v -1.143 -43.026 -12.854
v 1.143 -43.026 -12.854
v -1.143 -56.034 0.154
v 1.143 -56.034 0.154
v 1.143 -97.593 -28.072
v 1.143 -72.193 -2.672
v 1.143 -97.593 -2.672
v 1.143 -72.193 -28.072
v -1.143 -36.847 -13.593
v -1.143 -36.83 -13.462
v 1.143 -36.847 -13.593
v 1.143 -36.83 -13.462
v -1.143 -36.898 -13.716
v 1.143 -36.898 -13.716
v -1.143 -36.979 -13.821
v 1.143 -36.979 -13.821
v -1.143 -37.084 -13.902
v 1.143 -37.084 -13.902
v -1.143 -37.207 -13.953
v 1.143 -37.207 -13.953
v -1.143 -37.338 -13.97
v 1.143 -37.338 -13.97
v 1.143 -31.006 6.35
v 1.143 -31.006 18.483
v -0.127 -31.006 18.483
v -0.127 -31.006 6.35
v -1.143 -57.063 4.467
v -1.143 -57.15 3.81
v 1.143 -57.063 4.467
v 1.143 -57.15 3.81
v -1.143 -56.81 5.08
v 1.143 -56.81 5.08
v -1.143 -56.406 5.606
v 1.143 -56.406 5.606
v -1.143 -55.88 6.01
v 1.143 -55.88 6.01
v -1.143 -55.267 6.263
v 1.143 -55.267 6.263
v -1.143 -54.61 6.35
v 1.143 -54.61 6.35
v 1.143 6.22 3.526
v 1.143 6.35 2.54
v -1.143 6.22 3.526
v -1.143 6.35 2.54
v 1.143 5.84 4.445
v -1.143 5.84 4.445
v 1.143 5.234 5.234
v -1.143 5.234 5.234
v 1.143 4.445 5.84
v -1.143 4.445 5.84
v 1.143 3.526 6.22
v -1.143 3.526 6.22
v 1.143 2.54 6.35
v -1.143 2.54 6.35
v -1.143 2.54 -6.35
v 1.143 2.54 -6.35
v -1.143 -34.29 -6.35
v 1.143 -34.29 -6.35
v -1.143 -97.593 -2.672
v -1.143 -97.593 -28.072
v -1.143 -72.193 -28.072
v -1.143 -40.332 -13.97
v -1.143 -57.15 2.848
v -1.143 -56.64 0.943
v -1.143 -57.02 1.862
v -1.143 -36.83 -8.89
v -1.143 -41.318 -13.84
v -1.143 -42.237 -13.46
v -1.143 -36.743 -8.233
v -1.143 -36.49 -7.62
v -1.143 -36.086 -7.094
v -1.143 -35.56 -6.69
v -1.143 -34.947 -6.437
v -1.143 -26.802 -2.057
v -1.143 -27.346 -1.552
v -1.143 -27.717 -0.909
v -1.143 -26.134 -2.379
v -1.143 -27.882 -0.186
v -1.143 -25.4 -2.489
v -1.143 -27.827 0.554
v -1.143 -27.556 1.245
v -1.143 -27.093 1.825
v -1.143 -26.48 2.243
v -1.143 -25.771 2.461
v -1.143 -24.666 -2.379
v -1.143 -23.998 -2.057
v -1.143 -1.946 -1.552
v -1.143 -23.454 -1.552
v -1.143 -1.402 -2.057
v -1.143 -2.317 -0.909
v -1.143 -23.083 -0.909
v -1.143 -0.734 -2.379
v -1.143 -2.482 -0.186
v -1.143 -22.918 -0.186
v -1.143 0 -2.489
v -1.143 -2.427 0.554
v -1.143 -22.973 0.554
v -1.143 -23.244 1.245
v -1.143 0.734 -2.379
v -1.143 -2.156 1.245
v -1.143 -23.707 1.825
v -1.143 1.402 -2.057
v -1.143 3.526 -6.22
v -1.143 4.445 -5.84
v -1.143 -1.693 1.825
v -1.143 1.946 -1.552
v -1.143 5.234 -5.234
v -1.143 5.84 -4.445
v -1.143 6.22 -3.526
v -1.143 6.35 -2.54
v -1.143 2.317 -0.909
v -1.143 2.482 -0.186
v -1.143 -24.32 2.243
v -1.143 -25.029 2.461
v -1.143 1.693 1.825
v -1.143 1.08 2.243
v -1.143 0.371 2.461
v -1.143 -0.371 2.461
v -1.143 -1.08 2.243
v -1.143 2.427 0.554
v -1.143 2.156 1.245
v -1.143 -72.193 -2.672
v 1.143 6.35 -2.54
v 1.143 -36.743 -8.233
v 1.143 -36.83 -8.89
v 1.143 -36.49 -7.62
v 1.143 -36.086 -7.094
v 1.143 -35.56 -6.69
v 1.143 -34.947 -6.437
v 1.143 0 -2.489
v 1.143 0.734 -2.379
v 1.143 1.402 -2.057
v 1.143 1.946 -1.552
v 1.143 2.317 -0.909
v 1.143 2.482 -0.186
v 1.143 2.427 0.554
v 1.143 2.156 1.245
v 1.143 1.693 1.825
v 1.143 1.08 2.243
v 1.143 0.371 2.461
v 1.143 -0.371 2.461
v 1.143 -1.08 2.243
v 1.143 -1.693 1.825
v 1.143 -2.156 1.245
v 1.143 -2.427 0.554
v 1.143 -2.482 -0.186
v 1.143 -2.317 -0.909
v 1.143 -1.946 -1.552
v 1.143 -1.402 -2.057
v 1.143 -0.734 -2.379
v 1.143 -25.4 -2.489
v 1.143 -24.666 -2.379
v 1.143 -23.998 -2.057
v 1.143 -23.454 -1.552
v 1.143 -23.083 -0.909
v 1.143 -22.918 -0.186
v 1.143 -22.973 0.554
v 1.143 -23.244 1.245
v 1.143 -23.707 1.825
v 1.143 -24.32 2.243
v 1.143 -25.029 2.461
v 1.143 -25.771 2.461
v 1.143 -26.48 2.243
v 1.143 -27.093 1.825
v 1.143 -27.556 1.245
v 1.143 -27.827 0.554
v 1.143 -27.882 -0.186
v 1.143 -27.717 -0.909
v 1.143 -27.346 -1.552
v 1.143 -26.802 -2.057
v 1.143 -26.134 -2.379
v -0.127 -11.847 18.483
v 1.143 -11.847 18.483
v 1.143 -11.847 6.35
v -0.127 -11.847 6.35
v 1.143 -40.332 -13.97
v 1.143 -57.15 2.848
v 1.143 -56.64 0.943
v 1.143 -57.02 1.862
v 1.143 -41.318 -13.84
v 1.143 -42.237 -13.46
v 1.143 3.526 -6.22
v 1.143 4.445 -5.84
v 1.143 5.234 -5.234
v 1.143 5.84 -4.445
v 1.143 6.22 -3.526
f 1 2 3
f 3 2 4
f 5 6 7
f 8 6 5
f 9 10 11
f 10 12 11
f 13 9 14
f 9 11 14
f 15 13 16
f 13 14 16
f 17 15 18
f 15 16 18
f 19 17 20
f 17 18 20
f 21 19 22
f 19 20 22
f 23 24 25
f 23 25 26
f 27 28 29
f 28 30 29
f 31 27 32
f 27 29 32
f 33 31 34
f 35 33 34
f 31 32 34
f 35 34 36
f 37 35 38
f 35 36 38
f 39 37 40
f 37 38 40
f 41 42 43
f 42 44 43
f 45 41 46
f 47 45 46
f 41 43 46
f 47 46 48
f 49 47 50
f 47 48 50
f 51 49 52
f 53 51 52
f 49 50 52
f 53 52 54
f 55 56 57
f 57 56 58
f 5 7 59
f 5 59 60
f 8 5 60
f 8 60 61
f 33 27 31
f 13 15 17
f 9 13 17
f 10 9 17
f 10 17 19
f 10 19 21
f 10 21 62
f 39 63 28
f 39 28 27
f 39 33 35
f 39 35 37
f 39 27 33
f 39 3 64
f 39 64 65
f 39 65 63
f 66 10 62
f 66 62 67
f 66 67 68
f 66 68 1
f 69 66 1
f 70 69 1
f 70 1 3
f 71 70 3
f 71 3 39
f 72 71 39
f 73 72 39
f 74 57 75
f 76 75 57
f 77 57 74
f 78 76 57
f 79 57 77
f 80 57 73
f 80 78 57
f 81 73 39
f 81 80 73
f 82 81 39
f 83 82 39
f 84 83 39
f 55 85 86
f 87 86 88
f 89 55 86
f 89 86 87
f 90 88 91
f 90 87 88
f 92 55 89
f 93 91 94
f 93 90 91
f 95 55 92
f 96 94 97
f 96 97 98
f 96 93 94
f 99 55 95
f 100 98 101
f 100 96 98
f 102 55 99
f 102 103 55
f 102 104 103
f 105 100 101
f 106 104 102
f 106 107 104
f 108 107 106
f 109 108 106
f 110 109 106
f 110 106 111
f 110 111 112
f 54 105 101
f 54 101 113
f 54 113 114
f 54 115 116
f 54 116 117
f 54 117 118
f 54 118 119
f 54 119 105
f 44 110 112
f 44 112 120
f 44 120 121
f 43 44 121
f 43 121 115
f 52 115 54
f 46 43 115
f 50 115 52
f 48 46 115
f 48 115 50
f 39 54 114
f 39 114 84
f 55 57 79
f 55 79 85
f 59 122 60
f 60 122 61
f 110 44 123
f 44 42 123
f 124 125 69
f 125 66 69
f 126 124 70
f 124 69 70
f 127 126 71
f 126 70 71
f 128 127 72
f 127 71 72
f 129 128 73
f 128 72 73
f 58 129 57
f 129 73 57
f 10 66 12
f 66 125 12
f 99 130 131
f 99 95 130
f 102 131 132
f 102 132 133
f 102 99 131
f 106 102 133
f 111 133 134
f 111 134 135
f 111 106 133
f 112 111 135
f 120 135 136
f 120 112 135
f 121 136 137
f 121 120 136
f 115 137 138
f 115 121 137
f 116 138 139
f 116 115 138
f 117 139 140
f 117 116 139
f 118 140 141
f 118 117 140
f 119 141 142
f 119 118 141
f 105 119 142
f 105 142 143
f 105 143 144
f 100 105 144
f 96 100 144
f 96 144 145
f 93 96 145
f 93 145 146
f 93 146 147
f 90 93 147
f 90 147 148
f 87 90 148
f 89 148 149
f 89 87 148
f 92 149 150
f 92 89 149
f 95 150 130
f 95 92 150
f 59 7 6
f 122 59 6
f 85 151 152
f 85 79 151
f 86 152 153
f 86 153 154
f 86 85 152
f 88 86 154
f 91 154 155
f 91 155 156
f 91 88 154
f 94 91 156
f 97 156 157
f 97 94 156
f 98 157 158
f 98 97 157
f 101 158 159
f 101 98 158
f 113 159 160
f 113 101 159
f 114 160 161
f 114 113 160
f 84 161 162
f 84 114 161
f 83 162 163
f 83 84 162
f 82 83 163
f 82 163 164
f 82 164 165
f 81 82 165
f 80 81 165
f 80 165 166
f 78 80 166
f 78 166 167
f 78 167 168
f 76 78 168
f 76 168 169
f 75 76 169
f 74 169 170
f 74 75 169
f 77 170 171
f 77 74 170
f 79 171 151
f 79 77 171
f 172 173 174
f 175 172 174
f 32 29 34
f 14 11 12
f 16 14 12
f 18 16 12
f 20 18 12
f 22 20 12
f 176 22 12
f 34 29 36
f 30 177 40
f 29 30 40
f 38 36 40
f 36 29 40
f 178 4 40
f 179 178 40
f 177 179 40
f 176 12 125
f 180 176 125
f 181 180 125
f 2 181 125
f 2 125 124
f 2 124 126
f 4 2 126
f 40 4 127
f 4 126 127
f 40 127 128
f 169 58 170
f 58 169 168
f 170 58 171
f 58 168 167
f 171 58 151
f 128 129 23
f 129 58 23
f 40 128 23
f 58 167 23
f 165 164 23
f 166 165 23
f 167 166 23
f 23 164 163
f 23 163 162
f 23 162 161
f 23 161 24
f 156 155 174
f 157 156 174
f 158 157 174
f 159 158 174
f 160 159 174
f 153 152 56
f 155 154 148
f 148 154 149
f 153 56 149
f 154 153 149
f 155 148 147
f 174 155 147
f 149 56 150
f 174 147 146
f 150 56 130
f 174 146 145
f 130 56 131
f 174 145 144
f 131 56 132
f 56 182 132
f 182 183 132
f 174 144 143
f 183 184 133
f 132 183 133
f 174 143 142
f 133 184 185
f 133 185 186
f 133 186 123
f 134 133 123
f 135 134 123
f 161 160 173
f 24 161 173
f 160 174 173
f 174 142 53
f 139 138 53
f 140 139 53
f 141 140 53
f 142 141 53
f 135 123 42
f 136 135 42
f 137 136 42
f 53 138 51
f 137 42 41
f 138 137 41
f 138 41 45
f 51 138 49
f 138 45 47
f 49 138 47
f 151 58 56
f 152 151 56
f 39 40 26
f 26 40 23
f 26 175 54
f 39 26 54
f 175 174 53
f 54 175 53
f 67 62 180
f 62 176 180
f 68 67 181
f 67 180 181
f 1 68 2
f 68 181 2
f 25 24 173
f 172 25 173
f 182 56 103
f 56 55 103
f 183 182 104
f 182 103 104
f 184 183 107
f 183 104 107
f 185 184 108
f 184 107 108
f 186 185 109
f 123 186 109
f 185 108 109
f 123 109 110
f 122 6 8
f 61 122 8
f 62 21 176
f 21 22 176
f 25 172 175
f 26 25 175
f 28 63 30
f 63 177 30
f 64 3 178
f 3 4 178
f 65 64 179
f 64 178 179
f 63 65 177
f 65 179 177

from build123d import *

# Parameters (mm, degrees)
SKETCH1_R           = 2.4892
BOSS_EXTRUDE1_DEPTH = 1.143
FILLET1_R           = 2.54
FILLET2_R           = 0.508
FILLET3_R           = 3.81
FILLET4_R           = 2.54
SKETCH4_W           = 25.4
SKETCH4_H           = 25.4
BOSS_EXTRUDE4_DEPTH = 2.286
SKETCH5_W           = 12.133155836
SKETCH5_H           = 19.15881217
BOSS_EXTRUDE5_DEPTH = 1.27


with BuildPart() as part:
    # Sketch1 → Boss-Extrude1 (new, symmetric)
    with BuildSketch(Plane(origin=(0, 0, 0), x_dir=(0, 0, -1), z_dir=(1, 0, 0))):
        Polygon((-6.35, -57.15), (-6.35, 6.35), (6.35, 6.35), (6.35, -36.83), (13.97, -36.83), (13.97, -41.91), (-1.27, -57.15), align=None)
        Circle(SKETCH1_R, mode=Mode.SUBTRACT)
        with Locations((0, -25.4)):
            Circle(SKETCH1_R, mode=Mode.SUBTRACT)
    extrude(amount=BOSS_EXTRUDE1_DEPTH, both=True)

    # Fillet1
    fillet1_edges = [part.edges().sort_by_distance(p)[0] for p in [
        (0, -36.83, -6.35),
    ]]
    fillet(fillet1_edges, radius=FILLET1_R)

    # Fillet2
    fillet2_edges = [part.edges().sort_by_distance(p)[0] for p in [
        (0, -36.83, -13.97),
    ]]
    fillet(fillet2_edges, radius=FILLET2_R)

    # Fillet3
    fillet3_edges = [part.edges().sort_by_distance(p)[0] for p in [
        (0, 6.35, -6.35),
        (0, -41.91, -13.97),
        (0, -57.15, 1.27),
        (0, 6.35, 6.35),
    ]]
    fillet(fillet3_edges, radius=FILLET3_R)

    # Fillet4
    fillet4_edges = [part.edges().sort_by_distance(p)[0] for p in [
        (0, -57.15, 6.35),
    ]]
    fillet(fillet4_edges, radius=FILLET4_R)

    # Sketch5 → Boss-Extrude5 (add)
    with BuildSketch(Plane(origin=(1.143, 0, 0), x_dir=(0, 0, -1), z_dir=(1, 0, 0))):
        with Locations((-12.416577918, -21.426514681)):
            Rectangle(SKETCH5_W, SKETCH5_H)
    extrude(amount=-BOSS_EXTRUDE5_DEPTH)


with BuildPart() as body_2:
    # Sketch4 → Boss-Extrude4 (new body)
    with BuildSketch(Plane(origin=(1.143, 0, 0), x_dir=(0, 0, -1), z_dir=(1, 0, 0))):
        with Locations((15.372144996, -84.89279632)):
            Rectangle(SKETCH4_W, SKETCH4_H)
    extrude(amount=-BOSS_EXTRUDE4_DEPTH)


solid = Compound([part.part, body_2.part])
